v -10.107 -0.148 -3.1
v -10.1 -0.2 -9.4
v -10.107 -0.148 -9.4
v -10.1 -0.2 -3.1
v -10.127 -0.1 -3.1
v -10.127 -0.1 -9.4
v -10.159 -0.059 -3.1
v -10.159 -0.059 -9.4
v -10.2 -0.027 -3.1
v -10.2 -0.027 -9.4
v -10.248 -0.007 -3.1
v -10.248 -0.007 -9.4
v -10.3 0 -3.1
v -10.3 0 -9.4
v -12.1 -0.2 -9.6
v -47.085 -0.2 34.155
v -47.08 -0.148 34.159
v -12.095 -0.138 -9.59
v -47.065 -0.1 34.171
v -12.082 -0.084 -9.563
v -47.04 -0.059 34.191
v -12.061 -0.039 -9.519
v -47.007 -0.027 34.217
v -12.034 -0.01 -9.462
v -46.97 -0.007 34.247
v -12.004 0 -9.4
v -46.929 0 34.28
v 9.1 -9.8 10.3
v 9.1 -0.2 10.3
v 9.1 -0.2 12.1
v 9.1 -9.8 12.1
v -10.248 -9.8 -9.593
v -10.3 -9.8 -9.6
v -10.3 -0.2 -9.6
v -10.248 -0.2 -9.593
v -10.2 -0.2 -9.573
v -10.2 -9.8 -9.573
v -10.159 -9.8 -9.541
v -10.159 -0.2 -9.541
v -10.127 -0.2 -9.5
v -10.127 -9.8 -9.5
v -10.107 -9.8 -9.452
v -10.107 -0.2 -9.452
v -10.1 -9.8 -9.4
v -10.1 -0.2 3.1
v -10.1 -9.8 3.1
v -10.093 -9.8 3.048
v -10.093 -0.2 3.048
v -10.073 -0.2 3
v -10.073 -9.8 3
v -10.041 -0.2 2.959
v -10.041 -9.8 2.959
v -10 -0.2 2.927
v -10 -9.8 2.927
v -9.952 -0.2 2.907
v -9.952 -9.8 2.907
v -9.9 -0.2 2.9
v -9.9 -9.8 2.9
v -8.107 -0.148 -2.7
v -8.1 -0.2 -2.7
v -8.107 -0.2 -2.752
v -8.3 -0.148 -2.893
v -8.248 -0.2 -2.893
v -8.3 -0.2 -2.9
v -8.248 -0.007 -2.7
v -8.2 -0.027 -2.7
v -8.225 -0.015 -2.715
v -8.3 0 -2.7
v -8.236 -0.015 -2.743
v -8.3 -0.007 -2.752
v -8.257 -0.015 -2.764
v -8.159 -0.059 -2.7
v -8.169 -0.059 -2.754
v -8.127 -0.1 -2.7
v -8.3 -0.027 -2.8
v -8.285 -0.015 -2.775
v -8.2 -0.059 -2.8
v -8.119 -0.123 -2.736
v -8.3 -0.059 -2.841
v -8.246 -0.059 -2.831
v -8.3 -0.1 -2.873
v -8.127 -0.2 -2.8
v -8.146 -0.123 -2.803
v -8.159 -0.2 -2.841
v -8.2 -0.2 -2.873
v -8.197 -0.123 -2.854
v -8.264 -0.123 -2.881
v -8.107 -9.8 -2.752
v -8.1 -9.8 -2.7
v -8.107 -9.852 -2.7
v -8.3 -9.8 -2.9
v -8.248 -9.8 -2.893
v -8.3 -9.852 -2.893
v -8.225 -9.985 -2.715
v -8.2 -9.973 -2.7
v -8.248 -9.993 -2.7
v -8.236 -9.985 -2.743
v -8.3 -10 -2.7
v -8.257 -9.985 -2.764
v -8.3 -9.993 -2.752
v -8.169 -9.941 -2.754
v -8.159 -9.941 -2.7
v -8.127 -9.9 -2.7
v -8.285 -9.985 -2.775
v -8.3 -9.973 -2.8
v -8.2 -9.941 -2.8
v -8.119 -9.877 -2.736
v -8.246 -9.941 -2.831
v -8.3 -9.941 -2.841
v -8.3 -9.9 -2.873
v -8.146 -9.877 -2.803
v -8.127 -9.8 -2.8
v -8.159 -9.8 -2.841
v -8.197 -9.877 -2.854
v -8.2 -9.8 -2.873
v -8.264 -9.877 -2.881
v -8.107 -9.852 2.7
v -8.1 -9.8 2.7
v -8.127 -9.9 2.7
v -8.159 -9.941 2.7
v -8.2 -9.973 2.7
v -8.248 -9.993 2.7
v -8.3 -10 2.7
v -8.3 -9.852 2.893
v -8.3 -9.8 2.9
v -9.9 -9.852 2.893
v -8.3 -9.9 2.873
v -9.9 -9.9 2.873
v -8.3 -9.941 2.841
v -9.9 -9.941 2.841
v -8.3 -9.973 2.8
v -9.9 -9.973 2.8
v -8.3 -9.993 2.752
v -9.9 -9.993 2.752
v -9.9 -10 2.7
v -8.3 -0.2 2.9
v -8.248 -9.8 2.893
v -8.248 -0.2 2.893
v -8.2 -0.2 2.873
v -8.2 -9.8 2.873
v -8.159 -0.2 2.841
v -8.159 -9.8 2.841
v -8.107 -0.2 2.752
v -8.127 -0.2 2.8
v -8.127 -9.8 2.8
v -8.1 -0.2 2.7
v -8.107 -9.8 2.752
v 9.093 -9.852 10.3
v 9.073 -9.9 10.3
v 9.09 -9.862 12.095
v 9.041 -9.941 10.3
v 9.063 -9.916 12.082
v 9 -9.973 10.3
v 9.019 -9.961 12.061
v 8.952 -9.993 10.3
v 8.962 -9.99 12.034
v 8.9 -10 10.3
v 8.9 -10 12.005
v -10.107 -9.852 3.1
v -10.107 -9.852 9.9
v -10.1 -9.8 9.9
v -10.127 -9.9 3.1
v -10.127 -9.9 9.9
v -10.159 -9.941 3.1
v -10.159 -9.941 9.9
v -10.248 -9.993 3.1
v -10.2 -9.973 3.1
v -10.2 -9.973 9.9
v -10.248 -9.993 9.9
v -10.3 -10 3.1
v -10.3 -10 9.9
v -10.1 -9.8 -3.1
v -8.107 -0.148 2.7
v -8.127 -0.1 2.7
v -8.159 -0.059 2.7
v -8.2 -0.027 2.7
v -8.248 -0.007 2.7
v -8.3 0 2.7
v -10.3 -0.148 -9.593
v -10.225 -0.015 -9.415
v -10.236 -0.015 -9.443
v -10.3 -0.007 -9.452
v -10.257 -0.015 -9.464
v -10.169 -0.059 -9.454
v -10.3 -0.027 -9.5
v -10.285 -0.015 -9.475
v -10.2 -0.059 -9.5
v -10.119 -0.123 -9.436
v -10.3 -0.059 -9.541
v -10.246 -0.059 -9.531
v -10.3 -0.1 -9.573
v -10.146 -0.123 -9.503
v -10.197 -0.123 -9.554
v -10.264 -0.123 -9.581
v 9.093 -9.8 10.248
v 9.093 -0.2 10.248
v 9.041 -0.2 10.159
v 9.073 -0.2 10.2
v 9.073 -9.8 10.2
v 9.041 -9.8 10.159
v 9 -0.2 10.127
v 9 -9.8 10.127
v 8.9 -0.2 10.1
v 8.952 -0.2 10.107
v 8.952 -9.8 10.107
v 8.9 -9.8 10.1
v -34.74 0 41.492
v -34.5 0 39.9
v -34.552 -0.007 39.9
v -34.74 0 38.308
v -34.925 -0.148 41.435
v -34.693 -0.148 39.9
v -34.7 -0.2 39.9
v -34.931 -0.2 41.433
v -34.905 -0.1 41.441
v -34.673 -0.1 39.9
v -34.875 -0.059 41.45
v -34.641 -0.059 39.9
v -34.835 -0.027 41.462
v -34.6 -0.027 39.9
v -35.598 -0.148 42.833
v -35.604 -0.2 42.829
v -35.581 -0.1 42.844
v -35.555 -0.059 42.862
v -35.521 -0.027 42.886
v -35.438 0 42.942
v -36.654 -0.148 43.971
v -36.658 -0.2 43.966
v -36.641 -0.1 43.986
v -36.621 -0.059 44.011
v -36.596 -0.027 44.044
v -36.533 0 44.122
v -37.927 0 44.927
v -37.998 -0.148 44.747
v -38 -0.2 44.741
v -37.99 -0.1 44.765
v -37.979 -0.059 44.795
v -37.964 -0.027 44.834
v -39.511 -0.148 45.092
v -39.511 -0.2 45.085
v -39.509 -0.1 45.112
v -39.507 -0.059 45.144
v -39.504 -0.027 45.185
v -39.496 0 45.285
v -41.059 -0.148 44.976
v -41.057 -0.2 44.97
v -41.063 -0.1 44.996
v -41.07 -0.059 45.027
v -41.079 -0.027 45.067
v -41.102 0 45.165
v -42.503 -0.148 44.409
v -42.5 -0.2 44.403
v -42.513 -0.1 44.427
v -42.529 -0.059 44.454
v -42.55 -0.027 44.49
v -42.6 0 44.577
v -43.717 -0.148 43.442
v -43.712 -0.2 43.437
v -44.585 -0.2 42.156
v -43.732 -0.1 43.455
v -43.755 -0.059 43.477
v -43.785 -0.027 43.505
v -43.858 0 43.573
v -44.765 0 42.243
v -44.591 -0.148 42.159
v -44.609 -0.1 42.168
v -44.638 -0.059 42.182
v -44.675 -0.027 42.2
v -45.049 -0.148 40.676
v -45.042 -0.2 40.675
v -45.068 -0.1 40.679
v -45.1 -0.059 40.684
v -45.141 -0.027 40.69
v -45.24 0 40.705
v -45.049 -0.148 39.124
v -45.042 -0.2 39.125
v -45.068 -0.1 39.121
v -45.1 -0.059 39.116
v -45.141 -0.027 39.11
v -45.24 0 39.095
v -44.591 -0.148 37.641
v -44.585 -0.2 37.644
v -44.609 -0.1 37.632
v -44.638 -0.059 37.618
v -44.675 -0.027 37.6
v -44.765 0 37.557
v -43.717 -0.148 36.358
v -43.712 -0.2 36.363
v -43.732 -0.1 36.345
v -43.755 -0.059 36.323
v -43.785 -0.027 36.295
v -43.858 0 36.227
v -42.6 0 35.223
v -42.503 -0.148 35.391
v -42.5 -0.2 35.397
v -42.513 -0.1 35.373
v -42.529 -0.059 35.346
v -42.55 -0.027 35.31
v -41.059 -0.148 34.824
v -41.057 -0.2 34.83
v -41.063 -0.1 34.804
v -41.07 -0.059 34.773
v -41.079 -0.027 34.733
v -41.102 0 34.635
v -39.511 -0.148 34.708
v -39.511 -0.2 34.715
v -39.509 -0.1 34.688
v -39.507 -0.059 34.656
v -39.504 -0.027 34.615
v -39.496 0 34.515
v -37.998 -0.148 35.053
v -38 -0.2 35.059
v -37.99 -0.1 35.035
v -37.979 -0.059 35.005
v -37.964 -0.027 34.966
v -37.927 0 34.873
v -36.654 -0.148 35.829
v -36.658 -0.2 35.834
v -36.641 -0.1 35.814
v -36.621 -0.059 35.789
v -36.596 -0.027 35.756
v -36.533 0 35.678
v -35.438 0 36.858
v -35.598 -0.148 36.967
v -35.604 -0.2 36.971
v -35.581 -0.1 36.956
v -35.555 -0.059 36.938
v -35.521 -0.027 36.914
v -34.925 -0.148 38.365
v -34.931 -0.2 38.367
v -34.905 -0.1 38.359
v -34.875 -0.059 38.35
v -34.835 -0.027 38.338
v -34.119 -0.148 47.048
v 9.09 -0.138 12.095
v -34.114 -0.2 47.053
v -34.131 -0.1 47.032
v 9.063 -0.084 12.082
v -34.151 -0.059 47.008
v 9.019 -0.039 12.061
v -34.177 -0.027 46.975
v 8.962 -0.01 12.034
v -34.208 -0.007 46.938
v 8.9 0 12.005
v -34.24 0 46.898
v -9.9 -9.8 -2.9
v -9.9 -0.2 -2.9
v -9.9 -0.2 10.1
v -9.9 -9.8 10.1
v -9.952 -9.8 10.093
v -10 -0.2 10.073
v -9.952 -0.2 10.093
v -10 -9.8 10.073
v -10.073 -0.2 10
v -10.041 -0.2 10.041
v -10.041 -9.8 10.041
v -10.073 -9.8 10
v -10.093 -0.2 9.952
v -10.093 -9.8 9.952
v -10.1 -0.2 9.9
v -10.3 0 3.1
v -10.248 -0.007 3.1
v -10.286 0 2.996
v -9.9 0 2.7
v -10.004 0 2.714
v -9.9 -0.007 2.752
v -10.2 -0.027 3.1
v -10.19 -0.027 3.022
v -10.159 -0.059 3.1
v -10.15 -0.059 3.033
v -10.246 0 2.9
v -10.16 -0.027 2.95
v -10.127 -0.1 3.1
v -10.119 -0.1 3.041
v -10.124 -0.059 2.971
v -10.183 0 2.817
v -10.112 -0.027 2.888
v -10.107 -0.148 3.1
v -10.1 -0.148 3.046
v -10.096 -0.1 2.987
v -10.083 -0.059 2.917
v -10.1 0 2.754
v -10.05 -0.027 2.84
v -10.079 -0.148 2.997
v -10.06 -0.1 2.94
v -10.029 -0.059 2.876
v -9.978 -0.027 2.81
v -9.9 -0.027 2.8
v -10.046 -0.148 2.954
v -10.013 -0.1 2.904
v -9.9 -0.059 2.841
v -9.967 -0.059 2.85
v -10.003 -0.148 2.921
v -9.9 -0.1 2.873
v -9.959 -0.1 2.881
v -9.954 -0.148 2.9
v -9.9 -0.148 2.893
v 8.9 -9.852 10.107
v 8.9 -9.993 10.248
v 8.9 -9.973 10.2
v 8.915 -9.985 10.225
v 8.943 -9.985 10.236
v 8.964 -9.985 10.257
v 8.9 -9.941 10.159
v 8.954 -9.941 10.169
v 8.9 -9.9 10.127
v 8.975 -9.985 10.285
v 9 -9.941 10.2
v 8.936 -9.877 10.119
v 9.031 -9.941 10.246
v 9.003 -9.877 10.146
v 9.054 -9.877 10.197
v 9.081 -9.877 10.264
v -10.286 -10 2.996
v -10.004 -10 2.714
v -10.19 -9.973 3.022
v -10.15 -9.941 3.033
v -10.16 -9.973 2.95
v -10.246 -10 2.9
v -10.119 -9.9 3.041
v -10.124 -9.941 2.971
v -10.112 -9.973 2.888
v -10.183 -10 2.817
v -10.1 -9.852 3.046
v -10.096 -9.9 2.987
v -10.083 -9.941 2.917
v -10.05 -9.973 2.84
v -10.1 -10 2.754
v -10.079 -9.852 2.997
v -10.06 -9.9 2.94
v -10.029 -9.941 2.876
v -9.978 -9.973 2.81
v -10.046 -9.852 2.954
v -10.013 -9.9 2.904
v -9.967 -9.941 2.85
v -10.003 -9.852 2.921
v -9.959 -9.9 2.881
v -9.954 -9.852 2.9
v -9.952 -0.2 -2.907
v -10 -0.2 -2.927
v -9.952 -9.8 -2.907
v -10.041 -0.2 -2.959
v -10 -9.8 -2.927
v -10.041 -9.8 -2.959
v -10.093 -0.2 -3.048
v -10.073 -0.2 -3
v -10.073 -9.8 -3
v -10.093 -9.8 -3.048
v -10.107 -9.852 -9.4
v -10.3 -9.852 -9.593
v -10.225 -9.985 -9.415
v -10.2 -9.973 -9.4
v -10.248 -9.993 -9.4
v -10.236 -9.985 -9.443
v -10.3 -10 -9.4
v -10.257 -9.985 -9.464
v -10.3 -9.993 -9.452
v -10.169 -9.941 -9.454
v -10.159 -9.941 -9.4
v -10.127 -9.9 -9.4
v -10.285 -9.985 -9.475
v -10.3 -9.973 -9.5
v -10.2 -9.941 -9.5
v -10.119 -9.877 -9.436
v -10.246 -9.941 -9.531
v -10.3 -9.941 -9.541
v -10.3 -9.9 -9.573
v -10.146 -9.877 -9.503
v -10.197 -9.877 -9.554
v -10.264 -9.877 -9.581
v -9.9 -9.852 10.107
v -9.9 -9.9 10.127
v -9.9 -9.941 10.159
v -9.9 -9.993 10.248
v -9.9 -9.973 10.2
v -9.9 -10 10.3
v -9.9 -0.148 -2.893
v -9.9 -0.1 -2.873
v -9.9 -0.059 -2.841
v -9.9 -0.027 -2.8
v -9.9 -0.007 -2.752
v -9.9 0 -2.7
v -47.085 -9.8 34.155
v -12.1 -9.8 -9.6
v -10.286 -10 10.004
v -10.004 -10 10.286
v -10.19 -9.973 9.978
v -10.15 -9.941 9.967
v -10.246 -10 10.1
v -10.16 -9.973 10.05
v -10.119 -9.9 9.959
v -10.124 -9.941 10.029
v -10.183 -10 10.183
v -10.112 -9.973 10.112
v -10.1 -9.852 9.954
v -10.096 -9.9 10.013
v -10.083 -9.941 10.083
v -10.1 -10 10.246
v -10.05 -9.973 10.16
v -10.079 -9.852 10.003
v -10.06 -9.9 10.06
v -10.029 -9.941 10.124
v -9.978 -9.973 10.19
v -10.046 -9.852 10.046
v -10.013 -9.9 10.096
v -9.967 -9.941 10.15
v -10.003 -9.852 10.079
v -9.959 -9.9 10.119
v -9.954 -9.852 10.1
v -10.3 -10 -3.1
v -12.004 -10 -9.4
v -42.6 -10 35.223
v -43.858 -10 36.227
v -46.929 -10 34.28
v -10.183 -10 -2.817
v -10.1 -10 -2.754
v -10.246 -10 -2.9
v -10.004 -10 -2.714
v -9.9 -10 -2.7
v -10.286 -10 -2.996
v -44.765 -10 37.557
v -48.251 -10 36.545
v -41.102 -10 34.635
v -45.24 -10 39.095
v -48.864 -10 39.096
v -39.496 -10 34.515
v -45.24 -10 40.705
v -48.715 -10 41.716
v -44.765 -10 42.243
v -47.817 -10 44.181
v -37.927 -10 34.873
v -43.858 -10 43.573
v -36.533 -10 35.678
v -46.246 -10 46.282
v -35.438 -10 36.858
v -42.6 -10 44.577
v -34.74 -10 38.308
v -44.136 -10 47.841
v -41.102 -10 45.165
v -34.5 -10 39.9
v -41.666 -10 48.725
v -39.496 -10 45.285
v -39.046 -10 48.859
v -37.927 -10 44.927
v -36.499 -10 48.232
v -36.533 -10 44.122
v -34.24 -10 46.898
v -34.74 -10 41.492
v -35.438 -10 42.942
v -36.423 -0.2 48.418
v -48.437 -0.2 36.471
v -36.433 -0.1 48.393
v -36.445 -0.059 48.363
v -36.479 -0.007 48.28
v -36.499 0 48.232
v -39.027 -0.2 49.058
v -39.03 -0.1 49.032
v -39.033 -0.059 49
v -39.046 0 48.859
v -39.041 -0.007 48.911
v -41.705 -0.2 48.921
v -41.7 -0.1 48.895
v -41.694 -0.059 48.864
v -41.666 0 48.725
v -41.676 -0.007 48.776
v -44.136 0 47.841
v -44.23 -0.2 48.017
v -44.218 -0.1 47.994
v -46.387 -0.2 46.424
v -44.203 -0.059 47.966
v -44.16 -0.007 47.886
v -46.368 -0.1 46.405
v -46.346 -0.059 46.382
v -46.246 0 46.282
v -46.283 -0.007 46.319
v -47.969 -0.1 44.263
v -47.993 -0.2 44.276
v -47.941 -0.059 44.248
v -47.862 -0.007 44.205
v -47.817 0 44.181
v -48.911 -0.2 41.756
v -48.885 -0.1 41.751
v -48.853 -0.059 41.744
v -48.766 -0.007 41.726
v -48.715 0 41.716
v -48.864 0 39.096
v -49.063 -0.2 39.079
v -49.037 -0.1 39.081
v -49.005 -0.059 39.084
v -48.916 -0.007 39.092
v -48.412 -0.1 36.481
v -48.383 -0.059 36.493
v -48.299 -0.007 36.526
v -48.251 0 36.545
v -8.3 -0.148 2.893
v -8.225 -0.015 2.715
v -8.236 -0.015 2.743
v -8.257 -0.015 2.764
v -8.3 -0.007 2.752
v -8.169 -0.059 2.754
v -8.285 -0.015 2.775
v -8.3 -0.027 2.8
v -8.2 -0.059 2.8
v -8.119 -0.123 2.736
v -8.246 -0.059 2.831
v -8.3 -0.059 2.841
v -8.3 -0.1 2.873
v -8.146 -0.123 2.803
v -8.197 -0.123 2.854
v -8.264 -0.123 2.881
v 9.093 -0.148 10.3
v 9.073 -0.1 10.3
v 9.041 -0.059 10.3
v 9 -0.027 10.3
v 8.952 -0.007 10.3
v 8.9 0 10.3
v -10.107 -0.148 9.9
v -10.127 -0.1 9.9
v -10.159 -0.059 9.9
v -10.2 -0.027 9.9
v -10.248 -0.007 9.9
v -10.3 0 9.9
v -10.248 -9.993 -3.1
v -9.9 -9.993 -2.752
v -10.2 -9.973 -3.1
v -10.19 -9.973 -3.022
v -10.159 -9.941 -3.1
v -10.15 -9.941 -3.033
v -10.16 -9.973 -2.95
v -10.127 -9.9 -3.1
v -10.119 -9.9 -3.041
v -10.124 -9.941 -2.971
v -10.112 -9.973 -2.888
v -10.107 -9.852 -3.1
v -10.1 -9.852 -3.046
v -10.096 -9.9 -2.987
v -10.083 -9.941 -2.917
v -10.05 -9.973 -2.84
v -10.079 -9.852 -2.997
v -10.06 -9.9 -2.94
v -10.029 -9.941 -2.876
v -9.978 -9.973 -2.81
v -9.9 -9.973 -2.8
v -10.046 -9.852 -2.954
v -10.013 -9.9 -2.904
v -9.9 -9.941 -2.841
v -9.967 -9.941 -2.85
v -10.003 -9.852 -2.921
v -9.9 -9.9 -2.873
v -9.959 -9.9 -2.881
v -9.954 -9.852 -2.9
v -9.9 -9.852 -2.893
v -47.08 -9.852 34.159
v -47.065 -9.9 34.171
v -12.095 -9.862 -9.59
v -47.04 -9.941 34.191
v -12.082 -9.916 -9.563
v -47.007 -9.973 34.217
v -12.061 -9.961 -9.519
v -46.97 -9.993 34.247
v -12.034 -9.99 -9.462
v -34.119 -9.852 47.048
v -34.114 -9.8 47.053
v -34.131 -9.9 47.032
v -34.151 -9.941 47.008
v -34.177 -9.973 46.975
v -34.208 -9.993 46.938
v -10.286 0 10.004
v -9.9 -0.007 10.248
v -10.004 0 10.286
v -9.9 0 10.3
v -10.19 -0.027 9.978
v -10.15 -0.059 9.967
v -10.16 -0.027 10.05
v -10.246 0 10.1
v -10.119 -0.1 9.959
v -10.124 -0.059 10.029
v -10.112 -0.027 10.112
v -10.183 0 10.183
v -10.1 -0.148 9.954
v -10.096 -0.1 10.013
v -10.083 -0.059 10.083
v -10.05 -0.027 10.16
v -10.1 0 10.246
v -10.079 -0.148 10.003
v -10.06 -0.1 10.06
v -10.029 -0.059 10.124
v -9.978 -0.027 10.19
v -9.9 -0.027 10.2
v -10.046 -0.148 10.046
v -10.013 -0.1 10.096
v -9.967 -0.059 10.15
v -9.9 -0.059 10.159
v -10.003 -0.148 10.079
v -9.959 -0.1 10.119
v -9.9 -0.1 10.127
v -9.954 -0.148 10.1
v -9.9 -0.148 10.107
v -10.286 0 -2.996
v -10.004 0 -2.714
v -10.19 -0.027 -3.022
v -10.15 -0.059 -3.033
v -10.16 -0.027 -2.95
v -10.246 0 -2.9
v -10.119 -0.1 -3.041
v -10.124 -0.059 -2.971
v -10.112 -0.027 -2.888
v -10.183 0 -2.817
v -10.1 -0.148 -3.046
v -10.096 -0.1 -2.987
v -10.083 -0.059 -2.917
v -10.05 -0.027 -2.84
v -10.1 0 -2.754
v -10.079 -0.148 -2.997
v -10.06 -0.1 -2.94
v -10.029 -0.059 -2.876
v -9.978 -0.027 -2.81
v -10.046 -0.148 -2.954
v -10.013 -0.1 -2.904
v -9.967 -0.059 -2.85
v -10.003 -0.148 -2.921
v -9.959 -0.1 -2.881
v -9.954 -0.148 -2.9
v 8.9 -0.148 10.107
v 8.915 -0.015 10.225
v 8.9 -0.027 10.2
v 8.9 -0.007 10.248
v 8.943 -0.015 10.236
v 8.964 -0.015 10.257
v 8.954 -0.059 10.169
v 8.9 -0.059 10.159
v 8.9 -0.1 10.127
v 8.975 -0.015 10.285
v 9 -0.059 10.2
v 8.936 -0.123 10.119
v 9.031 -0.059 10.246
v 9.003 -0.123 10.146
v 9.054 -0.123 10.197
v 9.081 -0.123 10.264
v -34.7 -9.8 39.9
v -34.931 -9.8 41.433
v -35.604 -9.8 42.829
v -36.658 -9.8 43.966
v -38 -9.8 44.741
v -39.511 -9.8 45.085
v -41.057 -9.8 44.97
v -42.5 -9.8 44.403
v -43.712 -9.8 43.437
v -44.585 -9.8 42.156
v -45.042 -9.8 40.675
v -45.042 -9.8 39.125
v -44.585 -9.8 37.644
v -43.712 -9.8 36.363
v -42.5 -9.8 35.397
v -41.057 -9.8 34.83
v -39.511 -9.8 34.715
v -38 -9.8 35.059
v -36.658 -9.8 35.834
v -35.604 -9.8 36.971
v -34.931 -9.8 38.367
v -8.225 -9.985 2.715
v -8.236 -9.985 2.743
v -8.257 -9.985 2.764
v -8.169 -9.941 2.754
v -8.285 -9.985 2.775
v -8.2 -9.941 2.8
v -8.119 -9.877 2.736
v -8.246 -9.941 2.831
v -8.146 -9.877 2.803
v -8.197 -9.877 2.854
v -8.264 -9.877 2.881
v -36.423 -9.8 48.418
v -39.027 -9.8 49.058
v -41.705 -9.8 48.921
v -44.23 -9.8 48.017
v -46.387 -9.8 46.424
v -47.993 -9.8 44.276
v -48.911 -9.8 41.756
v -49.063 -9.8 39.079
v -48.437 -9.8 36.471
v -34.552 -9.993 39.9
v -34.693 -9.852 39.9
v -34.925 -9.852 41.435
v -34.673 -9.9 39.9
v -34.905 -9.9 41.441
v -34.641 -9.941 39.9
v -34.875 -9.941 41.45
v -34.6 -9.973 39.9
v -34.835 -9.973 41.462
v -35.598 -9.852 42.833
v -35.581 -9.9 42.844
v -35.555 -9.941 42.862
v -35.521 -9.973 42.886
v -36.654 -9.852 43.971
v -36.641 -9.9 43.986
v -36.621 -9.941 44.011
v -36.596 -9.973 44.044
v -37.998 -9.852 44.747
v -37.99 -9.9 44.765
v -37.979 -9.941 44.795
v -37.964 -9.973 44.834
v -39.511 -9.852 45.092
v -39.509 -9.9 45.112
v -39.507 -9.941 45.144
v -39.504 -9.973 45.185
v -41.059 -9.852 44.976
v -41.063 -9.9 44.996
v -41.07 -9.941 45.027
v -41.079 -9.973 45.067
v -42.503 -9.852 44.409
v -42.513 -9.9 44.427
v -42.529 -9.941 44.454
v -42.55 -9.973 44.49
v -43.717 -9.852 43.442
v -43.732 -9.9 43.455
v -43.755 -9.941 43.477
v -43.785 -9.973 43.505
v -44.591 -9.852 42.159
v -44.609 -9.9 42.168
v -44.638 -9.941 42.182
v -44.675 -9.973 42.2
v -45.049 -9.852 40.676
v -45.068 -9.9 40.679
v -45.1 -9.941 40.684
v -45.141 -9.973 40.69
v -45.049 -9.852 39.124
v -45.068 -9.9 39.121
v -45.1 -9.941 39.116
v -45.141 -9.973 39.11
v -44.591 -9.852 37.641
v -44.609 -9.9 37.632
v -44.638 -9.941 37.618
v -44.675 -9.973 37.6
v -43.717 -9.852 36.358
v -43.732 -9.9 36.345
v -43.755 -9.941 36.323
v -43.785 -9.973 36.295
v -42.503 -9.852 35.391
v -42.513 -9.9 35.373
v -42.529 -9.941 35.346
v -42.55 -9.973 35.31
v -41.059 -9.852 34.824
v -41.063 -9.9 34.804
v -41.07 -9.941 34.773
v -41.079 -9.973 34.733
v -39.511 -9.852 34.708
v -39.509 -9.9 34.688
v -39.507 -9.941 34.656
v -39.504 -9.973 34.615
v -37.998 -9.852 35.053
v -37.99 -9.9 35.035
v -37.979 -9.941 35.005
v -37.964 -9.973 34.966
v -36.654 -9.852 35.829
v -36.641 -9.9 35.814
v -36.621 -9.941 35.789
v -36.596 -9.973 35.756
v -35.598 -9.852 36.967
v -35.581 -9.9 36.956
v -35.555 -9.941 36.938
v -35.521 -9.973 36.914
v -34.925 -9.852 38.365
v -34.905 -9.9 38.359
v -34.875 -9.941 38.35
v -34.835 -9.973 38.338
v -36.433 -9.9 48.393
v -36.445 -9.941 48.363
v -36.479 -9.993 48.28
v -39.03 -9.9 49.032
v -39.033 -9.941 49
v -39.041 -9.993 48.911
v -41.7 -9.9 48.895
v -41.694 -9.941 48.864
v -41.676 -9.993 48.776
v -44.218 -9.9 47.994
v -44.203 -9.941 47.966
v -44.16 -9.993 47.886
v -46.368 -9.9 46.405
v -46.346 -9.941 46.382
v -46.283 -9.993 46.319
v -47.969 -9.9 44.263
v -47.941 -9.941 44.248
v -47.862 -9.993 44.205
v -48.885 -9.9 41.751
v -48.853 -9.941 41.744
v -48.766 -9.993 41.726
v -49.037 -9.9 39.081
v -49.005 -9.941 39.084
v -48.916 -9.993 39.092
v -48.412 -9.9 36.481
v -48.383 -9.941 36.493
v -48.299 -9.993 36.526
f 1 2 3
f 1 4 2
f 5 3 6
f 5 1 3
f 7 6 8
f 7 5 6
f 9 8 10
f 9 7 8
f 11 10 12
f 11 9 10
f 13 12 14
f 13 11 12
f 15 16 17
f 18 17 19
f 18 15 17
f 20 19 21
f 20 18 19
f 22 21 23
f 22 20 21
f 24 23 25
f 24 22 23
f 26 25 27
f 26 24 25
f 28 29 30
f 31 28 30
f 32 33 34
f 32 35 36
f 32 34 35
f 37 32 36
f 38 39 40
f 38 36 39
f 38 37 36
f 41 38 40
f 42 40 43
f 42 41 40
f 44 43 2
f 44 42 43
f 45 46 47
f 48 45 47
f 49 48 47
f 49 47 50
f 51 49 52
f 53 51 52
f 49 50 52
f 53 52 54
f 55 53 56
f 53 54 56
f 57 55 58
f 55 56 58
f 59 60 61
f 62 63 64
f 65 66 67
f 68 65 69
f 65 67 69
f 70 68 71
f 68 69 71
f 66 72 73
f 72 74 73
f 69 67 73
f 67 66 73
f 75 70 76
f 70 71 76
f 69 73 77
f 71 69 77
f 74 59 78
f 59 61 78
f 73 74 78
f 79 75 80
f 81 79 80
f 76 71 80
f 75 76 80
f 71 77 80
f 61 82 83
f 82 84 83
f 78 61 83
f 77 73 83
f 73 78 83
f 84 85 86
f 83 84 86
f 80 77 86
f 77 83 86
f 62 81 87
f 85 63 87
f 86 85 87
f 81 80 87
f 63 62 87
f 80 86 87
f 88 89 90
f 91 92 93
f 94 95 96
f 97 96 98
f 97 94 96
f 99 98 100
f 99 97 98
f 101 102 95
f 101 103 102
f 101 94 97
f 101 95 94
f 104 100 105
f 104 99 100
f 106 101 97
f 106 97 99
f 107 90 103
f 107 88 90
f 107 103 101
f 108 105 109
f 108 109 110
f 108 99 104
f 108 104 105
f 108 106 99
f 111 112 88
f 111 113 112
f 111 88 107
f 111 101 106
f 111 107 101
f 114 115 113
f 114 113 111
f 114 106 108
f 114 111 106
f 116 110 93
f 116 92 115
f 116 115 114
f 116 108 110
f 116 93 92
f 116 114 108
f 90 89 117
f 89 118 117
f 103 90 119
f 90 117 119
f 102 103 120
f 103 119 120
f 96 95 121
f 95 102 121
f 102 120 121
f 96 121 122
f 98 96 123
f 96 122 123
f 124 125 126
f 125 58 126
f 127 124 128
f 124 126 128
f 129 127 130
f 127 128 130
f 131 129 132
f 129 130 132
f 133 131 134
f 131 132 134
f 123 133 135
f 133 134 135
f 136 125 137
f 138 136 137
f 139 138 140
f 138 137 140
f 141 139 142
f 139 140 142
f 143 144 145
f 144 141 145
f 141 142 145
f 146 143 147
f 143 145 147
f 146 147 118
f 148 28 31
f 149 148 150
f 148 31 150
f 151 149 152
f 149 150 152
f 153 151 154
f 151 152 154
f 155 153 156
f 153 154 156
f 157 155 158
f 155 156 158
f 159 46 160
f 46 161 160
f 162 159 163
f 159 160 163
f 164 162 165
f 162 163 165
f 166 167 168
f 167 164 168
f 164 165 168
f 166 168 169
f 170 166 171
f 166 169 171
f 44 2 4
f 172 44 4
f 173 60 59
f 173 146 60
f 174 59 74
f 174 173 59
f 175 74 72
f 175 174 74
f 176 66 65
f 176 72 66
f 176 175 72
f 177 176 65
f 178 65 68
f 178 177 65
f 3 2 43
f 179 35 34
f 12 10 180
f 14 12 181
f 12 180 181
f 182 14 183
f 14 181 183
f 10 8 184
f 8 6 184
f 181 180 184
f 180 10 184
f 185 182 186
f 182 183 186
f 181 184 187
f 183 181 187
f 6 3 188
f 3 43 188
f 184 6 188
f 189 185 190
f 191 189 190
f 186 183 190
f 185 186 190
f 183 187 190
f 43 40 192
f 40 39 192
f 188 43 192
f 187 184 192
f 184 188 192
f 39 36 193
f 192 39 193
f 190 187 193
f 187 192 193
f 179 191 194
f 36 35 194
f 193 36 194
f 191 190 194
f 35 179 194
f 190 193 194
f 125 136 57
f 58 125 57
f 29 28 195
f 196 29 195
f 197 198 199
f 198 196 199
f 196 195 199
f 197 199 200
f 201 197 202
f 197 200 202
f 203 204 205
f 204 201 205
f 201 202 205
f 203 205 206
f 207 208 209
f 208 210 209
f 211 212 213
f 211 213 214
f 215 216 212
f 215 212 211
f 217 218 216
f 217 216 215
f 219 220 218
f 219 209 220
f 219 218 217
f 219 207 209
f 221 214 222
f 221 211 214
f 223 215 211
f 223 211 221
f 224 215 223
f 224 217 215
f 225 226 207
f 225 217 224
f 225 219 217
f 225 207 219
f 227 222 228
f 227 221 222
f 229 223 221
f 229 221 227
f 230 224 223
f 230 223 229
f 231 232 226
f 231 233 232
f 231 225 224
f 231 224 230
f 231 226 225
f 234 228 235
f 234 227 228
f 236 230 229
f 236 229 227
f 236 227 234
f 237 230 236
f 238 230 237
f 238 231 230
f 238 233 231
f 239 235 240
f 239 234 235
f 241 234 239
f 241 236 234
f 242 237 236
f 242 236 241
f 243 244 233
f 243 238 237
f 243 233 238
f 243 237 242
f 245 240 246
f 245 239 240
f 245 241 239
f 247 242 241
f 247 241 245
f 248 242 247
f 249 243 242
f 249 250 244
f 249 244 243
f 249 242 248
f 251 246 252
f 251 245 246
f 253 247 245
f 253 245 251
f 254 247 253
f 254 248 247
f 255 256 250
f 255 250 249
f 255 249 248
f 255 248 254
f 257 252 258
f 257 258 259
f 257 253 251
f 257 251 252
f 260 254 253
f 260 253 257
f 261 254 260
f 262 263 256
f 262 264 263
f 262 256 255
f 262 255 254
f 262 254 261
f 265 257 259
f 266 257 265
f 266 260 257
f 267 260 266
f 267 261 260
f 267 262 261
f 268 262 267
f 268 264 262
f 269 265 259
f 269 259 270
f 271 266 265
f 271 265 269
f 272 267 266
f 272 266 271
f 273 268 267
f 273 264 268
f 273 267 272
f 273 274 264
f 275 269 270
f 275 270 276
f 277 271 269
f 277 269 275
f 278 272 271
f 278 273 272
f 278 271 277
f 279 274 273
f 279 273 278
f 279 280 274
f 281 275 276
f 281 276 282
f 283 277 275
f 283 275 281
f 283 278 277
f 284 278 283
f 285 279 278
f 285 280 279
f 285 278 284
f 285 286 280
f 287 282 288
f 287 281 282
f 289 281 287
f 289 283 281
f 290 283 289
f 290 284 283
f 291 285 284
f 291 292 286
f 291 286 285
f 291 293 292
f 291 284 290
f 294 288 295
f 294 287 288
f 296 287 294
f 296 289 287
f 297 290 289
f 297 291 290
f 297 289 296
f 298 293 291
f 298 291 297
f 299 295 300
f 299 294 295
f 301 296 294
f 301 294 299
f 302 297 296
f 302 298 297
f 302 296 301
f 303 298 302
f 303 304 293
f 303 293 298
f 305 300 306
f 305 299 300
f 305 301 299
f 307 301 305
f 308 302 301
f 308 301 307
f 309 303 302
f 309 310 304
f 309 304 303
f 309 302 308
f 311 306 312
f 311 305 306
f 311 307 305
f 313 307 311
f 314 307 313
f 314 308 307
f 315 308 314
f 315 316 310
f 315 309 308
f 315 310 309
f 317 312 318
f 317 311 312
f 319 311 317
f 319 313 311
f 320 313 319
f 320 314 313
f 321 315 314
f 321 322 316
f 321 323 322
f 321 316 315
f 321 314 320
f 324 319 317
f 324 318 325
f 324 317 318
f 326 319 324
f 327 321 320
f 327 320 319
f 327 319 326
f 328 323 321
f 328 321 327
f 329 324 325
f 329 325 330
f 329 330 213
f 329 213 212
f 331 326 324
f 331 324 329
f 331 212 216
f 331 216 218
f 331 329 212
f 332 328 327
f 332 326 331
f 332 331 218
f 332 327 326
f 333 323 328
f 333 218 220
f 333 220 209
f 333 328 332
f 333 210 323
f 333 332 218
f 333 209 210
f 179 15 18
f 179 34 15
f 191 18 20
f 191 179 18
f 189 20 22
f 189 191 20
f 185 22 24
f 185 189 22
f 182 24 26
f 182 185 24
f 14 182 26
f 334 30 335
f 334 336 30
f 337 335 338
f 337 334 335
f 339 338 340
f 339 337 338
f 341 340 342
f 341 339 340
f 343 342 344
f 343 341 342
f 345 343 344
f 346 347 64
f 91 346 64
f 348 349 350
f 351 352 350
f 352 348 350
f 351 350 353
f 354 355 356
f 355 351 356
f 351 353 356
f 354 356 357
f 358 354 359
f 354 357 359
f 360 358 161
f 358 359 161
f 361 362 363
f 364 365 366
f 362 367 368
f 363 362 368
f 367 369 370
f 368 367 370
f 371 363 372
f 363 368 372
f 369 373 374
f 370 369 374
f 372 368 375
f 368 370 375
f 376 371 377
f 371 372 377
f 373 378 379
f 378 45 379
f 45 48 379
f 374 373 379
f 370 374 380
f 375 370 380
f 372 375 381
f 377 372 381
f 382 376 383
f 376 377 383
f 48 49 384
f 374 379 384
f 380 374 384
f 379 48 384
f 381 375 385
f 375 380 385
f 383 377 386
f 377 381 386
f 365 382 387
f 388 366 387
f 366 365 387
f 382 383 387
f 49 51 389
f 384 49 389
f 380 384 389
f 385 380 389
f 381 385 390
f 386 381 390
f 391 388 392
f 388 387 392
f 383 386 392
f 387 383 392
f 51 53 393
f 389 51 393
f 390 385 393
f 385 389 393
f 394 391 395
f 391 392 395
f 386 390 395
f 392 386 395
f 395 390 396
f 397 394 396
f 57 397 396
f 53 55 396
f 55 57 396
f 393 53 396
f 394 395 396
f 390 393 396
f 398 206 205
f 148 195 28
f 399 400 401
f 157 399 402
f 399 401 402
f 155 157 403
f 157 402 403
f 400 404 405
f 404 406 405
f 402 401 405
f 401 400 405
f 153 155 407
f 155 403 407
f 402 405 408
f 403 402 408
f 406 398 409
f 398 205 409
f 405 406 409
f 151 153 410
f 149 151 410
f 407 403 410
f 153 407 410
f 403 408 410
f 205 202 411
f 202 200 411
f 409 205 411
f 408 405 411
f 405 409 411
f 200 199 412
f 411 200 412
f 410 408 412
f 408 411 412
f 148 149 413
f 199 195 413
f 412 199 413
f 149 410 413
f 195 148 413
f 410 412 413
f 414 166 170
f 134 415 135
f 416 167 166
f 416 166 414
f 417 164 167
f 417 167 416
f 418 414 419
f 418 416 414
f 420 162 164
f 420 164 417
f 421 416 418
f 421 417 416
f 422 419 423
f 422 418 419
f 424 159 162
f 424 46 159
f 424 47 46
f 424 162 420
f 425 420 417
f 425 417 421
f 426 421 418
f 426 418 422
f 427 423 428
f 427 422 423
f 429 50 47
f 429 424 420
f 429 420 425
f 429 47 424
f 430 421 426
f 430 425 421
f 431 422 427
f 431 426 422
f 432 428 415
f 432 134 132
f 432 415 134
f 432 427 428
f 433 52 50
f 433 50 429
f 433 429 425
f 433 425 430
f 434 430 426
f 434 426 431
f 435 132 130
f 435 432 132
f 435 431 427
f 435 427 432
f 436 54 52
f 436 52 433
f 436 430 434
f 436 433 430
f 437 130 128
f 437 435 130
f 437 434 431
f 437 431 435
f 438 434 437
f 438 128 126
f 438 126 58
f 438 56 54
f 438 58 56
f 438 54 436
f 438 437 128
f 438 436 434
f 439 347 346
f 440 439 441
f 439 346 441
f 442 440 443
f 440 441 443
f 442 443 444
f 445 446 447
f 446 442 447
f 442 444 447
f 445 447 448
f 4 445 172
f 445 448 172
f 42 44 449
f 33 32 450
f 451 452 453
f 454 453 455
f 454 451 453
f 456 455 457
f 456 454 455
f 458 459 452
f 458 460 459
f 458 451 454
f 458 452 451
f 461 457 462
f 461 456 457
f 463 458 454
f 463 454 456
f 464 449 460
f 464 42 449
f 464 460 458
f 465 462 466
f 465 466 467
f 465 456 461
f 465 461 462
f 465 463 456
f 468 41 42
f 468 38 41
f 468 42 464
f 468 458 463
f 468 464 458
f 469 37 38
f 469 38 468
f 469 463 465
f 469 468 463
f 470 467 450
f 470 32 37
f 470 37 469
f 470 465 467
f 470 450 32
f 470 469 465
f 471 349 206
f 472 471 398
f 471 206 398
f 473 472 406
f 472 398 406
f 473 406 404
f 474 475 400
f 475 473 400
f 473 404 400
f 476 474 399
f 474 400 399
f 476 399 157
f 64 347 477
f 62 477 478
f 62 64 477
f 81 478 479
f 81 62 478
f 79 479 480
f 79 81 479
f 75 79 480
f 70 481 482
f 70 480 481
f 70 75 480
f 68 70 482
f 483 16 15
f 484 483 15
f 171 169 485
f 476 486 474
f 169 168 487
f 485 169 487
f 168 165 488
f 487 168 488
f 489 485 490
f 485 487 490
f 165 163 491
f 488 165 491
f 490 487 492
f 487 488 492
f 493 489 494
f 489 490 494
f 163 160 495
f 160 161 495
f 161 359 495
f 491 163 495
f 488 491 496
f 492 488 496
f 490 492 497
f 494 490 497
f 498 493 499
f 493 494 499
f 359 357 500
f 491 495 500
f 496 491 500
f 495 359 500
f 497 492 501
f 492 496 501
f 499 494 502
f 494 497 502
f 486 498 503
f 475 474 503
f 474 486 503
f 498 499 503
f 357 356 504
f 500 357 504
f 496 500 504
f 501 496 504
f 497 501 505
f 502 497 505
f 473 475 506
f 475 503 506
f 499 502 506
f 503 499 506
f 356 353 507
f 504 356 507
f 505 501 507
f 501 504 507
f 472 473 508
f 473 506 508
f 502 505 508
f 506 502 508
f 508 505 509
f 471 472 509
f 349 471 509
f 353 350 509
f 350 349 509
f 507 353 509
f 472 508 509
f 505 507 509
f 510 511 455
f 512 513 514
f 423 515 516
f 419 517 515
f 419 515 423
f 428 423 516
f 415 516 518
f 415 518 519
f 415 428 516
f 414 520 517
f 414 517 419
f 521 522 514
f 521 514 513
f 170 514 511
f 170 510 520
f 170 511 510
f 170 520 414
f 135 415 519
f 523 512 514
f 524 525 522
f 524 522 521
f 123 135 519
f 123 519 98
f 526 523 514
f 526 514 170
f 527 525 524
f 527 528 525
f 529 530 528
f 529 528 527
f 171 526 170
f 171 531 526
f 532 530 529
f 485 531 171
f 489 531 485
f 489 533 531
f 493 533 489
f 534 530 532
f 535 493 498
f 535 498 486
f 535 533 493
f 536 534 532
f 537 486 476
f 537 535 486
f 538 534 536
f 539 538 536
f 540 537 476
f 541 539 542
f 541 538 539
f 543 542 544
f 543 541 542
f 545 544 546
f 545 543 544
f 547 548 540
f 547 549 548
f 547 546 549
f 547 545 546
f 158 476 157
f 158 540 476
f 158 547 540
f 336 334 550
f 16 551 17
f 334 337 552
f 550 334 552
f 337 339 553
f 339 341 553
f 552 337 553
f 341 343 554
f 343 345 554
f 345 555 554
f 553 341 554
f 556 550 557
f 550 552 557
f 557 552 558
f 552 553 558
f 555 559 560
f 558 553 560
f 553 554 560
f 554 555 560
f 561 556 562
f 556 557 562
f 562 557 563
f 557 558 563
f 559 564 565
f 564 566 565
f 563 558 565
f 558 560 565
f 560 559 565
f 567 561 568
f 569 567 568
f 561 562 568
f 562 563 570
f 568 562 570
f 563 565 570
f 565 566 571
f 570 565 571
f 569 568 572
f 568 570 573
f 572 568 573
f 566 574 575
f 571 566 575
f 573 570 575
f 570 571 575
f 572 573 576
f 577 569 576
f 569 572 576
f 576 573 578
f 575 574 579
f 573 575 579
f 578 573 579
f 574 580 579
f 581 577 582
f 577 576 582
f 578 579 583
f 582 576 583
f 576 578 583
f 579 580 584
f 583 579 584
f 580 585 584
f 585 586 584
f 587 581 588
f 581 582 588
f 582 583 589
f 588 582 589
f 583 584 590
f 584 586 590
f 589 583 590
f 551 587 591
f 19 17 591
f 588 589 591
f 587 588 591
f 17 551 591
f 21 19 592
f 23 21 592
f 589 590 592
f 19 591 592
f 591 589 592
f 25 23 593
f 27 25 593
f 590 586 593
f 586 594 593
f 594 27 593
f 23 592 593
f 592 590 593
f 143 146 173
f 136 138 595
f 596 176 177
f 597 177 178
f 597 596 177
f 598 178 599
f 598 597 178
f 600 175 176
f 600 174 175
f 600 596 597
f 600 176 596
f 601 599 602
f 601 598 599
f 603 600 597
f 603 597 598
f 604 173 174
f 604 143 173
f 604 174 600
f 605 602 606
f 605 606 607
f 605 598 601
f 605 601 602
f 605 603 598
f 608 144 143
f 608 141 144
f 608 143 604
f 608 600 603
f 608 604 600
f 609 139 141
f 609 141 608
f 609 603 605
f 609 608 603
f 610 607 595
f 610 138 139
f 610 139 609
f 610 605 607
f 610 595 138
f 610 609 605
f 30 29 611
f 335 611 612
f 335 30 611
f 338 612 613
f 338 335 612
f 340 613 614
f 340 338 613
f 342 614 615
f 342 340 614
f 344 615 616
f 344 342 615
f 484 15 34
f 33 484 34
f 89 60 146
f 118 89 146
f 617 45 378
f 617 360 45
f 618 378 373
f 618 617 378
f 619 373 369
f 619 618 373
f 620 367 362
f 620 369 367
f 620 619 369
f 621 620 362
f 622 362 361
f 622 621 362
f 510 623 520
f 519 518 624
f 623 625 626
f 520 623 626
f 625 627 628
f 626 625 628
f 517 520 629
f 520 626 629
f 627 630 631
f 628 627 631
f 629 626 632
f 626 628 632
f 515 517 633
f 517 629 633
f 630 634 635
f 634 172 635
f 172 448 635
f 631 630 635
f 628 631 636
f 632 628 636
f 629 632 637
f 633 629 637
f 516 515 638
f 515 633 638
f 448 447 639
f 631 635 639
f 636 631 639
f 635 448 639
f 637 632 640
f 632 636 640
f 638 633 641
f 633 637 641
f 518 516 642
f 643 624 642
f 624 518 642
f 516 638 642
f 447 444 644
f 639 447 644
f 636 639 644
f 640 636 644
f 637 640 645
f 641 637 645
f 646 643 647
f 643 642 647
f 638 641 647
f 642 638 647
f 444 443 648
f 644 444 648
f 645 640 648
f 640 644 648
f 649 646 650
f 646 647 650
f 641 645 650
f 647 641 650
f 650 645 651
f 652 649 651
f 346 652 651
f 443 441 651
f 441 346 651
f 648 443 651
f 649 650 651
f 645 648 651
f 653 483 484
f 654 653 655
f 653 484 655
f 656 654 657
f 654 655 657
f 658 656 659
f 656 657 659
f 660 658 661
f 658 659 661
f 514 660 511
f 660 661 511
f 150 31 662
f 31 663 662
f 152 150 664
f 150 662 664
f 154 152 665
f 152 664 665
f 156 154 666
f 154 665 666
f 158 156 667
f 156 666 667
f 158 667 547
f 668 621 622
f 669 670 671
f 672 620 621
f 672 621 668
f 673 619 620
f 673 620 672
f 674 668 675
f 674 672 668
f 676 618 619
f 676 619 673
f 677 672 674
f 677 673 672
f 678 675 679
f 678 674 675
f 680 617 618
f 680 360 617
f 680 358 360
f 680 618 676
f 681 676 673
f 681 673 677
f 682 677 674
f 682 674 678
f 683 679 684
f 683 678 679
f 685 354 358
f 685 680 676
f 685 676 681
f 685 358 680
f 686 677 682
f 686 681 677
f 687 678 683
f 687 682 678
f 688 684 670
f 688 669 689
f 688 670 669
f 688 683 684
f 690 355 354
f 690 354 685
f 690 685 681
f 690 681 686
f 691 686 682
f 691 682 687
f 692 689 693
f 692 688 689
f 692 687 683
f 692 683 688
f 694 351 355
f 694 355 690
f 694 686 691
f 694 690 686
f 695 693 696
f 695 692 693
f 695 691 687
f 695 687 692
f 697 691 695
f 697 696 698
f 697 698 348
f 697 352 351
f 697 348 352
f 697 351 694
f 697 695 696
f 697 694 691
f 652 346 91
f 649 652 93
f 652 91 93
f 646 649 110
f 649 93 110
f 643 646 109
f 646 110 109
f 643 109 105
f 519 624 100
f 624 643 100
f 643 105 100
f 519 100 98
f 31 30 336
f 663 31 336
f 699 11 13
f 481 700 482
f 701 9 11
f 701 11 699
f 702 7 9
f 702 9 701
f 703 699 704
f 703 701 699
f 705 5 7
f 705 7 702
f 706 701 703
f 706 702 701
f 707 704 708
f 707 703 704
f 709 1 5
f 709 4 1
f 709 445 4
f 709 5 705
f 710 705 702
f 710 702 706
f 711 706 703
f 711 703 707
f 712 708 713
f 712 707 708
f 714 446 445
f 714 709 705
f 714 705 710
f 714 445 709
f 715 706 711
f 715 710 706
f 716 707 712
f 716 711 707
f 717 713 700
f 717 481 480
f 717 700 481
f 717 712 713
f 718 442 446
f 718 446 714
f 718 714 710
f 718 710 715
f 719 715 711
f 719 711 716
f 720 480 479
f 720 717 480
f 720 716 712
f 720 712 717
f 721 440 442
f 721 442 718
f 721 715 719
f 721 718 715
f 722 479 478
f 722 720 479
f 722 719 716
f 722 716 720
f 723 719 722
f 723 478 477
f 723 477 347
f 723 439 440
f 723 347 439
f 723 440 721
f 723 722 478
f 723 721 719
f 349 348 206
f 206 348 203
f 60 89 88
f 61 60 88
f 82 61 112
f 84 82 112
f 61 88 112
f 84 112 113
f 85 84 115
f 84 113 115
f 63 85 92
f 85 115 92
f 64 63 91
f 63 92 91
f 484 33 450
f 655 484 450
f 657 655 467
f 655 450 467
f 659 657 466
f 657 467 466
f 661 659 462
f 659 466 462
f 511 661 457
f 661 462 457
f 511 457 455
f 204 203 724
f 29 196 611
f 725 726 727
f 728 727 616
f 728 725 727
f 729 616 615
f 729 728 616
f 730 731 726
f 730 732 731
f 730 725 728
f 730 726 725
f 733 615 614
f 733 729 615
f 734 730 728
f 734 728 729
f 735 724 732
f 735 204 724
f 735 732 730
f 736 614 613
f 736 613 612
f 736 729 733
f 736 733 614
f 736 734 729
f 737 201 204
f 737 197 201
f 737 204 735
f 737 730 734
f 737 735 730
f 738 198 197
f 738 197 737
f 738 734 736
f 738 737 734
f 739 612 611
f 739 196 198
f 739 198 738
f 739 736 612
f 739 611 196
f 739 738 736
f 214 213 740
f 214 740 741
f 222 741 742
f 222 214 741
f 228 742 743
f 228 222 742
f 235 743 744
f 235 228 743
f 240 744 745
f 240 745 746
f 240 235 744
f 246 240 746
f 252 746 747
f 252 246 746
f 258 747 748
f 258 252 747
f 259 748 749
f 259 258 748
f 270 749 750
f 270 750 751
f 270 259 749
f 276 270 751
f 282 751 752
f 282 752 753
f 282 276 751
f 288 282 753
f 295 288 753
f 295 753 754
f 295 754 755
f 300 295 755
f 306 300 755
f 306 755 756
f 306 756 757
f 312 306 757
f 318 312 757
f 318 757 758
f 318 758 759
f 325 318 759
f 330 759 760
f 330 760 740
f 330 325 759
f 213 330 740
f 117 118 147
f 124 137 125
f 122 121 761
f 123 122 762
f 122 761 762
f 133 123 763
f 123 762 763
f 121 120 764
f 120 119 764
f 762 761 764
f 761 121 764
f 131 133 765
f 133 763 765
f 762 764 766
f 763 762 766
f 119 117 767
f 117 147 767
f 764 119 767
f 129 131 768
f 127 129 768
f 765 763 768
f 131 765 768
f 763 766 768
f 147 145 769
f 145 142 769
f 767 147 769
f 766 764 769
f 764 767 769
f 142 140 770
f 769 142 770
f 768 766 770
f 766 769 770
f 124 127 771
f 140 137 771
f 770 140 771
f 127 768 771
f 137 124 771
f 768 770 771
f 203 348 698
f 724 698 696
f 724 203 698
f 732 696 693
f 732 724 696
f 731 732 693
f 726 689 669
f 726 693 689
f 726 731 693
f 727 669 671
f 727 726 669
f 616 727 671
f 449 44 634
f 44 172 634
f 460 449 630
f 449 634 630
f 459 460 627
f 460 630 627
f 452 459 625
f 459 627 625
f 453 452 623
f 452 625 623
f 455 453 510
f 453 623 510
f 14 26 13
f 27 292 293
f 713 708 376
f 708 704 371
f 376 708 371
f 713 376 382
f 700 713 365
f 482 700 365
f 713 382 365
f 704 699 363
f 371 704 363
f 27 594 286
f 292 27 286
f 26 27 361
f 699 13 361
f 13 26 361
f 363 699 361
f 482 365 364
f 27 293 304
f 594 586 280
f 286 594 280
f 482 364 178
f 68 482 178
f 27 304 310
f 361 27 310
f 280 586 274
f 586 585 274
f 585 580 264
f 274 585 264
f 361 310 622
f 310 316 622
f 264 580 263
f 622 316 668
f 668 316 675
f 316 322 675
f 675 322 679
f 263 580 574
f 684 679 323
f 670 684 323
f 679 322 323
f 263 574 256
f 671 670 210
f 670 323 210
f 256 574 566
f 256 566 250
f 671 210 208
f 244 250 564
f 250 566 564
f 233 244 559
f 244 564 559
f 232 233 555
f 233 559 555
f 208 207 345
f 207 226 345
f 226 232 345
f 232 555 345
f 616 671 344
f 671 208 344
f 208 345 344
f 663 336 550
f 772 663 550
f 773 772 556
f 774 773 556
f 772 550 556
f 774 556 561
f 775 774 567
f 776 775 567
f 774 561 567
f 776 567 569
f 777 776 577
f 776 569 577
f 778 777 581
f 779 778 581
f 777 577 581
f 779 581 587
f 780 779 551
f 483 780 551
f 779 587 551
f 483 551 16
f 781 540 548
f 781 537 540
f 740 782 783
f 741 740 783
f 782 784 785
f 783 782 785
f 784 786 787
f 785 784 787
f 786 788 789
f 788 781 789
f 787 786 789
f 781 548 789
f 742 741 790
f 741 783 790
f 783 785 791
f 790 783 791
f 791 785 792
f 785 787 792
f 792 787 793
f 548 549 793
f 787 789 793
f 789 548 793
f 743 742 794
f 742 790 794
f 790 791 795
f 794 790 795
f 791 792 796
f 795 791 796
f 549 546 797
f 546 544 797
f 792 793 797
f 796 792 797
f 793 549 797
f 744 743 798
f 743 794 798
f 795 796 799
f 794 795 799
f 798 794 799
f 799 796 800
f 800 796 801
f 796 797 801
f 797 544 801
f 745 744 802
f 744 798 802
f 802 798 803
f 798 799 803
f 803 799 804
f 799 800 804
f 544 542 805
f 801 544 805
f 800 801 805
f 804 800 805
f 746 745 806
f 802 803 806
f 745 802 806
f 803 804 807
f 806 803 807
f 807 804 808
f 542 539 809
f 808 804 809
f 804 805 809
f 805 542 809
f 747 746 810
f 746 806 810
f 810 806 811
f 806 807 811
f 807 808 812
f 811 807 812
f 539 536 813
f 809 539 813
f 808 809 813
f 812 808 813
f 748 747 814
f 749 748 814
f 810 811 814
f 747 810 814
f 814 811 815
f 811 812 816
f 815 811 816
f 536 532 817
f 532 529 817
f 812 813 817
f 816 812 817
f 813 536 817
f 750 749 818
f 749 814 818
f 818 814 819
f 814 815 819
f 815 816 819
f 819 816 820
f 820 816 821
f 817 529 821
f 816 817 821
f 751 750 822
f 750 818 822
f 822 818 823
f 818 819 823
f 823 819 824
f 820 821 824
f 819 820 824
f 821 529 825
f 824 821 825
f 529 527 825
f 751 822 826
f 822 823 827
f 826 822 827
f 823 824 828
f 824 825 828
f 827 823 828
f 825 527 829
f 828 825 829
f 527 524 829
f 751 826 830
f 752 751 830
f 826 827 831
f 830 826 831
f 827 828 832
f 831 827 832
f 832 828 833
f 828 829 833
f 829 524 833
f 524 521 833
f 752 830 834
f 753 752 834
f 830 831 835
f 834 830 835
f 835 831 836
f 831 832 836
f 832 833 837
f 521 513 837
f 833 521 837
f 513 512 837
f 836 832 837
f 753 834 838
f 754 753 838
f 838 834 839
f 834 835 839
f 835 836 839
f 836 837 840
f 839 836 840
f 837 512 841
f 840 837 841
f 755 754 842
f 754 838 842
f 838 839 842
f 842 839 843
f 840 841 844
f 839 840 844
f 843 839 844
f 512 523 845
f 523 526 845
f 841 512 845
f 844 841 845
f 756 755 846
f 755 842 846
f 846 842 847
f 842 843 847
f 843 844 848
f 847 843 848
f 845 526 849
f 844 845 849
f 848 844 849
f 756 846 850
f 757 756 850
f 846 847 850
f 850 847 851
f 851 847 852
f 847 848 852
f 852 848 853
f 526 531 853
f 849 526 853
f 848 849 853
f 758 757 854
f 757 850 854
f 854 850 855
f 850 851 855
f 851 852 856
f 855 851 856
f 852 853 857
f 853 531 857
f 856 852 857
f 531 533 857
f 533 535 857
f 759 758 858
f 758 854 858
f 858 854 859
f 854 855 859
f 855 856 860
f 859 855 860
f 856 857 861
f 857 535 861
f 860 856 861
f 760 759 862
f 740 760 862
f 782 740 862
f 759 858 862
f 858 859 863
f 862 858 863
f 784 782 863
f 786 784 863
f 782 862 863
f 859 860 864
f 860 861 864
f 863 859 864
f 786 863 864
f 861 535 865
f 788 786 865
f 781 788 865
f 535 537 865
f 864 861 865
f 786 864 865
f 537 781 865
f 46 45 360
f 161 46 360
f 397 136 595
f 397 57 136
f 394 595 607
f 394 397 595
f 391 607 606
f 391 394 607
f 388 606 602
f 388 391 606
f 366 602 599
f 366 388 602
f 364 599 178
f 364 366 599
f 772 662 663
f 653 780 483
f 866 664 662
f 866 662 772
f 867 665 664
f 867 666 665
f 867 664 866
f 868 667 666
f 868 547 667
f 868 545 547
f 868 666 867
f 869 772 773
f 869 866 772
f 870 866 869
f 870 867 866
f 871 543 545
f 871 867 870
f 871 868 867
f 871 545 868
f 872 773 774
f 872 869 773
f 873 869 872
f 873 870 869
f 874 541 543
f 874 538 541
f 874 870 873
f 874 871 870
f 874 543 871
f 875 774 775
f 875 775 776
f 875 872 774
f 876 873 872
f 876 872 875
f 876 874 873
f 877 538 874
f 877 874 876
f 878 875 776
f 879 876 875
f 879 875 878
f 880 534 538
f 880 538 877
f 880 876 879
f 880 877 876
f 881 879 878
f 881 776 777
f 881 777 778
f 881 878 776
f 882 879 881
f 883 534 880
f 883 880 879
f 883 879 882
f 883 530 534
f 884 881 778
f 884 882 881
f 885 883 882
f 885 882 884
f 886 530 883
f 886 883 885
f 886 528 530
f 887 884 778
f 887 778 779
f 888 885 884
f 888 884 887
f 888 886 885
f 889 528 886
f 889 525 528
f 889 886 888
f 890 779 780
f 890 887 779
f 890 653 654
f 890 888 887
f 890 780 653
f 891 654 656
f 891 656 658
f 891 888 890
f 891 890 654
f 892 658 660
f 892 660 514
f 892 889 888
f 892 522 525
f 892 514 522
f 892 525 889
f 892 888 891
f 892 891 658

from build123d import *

# Parameters (mm, degrees)
F0_R     = 5.2
F1_DEPTH = 10
F2_R     = 0.2


with BuildPart() as f1:
    # F0 (on Front) → F1 (new body)
    with BuildSketch(Plane.XZ):
        Polygon((2.9, 10.1), (9.1, 10.1), (9.1, 12.1), (-12.1, 12.1), (-12.1, -9.6), (-10.1, -9.6), (-10.1, -2.9), (-8.1, -2.9), (-8.1, 2.9), (-10.1, 2.9), (-10.1, 10.1), (-2.9, 10.1), align=None)
        with BuildLine():
            Line((-12.1, 12.1), (9.1, 12.1))
            Line((9.1, 12.1), (-34.1143752893, 47.0530795261))
            ThreePointArc((-34.1143752893, 47.0530795261), (-31.5973574285, 43.863095549), (-30.7, 39.9))
            ThreePointArc((-30.7, 39.9), (-36.8558404571, 31.2182321686), (-47.0854549299, 34.1546333929))
            Line((-47.0854549299, 34.1546333929), (-12.1, -9.6))
            Line((-12.1, -9.6), (-12.1, 12.1))
        make_face()
        with BuildLine():
            ThreePointArc((-30.7, 39.9), (-31.5973574285, 43.863095549), (-34.1143752893, 47.0530795261))
            ThreePointArc((-34.1143752893, 47.0530795261), (-46.3870917462, 46.4236217454), (-47.0854549299, 34.1546333929))
            ThreePointArc((-47.0854549299, 34.1546333929), (-36.8558404571, 31.2182321686), (-30.7, 39.9))
        make_face()
        with Locations((-39.9, 39.9)):
            Circle(F0_R, mode=Mode.SUBTRACT)
    extrude(amount=F1_DEPTH)

    # F2
    f2_edges = [f1.edges().sort_by_distance(p)[0] for p in [
        (-8.1, -5, -2.9),
        (-8.1, -5, 2.9),
        (-8.1, 0, 0),
        (-8.1, -10, 0),
        (-10.1, -5, 2.9),
        (-10.1, -5, 10.1),
        (-10.1, 0, 6.5),
        (-10.1, -10, 6.5),
        (-10.1, -5, -9.6),
        (-10.1, -5, -2.9),
        (-10.1, 0, -6.25),
        (-10.1, -10, -6.25),
        (9.1, -5, 10.1),
        (-0.5, 0, 10.1),
        (-0.5, -10, 10.1),
        (9.1, 0, 11.1),
        (-12.507188, 0, 29.57654),
        (-46.387092, 0, 46.423622),
        (-29.592727, 0, 12.277317),
        (-11.1, 0, -9.6),
        (-9.1, 0, -2.9),
        (-9.1, 0, 2.9),
        (-45.1, 0, 39.9),
        (9.1, -10, 11.1),
        (-12.507188, -10, 29.57654),
        (-46.387092, -10, 46.423622),
        (-29.592727, -10, 12.277317),
        (-11.1, -10, -9.6),
        (-9.1, -10, -2.9),
        (-9.1, -10, 2.9),
        (-45.1, -10, 39.9),
    ]]
    fillet(f2_edges, radius=F2_R)


solid = f1.part
